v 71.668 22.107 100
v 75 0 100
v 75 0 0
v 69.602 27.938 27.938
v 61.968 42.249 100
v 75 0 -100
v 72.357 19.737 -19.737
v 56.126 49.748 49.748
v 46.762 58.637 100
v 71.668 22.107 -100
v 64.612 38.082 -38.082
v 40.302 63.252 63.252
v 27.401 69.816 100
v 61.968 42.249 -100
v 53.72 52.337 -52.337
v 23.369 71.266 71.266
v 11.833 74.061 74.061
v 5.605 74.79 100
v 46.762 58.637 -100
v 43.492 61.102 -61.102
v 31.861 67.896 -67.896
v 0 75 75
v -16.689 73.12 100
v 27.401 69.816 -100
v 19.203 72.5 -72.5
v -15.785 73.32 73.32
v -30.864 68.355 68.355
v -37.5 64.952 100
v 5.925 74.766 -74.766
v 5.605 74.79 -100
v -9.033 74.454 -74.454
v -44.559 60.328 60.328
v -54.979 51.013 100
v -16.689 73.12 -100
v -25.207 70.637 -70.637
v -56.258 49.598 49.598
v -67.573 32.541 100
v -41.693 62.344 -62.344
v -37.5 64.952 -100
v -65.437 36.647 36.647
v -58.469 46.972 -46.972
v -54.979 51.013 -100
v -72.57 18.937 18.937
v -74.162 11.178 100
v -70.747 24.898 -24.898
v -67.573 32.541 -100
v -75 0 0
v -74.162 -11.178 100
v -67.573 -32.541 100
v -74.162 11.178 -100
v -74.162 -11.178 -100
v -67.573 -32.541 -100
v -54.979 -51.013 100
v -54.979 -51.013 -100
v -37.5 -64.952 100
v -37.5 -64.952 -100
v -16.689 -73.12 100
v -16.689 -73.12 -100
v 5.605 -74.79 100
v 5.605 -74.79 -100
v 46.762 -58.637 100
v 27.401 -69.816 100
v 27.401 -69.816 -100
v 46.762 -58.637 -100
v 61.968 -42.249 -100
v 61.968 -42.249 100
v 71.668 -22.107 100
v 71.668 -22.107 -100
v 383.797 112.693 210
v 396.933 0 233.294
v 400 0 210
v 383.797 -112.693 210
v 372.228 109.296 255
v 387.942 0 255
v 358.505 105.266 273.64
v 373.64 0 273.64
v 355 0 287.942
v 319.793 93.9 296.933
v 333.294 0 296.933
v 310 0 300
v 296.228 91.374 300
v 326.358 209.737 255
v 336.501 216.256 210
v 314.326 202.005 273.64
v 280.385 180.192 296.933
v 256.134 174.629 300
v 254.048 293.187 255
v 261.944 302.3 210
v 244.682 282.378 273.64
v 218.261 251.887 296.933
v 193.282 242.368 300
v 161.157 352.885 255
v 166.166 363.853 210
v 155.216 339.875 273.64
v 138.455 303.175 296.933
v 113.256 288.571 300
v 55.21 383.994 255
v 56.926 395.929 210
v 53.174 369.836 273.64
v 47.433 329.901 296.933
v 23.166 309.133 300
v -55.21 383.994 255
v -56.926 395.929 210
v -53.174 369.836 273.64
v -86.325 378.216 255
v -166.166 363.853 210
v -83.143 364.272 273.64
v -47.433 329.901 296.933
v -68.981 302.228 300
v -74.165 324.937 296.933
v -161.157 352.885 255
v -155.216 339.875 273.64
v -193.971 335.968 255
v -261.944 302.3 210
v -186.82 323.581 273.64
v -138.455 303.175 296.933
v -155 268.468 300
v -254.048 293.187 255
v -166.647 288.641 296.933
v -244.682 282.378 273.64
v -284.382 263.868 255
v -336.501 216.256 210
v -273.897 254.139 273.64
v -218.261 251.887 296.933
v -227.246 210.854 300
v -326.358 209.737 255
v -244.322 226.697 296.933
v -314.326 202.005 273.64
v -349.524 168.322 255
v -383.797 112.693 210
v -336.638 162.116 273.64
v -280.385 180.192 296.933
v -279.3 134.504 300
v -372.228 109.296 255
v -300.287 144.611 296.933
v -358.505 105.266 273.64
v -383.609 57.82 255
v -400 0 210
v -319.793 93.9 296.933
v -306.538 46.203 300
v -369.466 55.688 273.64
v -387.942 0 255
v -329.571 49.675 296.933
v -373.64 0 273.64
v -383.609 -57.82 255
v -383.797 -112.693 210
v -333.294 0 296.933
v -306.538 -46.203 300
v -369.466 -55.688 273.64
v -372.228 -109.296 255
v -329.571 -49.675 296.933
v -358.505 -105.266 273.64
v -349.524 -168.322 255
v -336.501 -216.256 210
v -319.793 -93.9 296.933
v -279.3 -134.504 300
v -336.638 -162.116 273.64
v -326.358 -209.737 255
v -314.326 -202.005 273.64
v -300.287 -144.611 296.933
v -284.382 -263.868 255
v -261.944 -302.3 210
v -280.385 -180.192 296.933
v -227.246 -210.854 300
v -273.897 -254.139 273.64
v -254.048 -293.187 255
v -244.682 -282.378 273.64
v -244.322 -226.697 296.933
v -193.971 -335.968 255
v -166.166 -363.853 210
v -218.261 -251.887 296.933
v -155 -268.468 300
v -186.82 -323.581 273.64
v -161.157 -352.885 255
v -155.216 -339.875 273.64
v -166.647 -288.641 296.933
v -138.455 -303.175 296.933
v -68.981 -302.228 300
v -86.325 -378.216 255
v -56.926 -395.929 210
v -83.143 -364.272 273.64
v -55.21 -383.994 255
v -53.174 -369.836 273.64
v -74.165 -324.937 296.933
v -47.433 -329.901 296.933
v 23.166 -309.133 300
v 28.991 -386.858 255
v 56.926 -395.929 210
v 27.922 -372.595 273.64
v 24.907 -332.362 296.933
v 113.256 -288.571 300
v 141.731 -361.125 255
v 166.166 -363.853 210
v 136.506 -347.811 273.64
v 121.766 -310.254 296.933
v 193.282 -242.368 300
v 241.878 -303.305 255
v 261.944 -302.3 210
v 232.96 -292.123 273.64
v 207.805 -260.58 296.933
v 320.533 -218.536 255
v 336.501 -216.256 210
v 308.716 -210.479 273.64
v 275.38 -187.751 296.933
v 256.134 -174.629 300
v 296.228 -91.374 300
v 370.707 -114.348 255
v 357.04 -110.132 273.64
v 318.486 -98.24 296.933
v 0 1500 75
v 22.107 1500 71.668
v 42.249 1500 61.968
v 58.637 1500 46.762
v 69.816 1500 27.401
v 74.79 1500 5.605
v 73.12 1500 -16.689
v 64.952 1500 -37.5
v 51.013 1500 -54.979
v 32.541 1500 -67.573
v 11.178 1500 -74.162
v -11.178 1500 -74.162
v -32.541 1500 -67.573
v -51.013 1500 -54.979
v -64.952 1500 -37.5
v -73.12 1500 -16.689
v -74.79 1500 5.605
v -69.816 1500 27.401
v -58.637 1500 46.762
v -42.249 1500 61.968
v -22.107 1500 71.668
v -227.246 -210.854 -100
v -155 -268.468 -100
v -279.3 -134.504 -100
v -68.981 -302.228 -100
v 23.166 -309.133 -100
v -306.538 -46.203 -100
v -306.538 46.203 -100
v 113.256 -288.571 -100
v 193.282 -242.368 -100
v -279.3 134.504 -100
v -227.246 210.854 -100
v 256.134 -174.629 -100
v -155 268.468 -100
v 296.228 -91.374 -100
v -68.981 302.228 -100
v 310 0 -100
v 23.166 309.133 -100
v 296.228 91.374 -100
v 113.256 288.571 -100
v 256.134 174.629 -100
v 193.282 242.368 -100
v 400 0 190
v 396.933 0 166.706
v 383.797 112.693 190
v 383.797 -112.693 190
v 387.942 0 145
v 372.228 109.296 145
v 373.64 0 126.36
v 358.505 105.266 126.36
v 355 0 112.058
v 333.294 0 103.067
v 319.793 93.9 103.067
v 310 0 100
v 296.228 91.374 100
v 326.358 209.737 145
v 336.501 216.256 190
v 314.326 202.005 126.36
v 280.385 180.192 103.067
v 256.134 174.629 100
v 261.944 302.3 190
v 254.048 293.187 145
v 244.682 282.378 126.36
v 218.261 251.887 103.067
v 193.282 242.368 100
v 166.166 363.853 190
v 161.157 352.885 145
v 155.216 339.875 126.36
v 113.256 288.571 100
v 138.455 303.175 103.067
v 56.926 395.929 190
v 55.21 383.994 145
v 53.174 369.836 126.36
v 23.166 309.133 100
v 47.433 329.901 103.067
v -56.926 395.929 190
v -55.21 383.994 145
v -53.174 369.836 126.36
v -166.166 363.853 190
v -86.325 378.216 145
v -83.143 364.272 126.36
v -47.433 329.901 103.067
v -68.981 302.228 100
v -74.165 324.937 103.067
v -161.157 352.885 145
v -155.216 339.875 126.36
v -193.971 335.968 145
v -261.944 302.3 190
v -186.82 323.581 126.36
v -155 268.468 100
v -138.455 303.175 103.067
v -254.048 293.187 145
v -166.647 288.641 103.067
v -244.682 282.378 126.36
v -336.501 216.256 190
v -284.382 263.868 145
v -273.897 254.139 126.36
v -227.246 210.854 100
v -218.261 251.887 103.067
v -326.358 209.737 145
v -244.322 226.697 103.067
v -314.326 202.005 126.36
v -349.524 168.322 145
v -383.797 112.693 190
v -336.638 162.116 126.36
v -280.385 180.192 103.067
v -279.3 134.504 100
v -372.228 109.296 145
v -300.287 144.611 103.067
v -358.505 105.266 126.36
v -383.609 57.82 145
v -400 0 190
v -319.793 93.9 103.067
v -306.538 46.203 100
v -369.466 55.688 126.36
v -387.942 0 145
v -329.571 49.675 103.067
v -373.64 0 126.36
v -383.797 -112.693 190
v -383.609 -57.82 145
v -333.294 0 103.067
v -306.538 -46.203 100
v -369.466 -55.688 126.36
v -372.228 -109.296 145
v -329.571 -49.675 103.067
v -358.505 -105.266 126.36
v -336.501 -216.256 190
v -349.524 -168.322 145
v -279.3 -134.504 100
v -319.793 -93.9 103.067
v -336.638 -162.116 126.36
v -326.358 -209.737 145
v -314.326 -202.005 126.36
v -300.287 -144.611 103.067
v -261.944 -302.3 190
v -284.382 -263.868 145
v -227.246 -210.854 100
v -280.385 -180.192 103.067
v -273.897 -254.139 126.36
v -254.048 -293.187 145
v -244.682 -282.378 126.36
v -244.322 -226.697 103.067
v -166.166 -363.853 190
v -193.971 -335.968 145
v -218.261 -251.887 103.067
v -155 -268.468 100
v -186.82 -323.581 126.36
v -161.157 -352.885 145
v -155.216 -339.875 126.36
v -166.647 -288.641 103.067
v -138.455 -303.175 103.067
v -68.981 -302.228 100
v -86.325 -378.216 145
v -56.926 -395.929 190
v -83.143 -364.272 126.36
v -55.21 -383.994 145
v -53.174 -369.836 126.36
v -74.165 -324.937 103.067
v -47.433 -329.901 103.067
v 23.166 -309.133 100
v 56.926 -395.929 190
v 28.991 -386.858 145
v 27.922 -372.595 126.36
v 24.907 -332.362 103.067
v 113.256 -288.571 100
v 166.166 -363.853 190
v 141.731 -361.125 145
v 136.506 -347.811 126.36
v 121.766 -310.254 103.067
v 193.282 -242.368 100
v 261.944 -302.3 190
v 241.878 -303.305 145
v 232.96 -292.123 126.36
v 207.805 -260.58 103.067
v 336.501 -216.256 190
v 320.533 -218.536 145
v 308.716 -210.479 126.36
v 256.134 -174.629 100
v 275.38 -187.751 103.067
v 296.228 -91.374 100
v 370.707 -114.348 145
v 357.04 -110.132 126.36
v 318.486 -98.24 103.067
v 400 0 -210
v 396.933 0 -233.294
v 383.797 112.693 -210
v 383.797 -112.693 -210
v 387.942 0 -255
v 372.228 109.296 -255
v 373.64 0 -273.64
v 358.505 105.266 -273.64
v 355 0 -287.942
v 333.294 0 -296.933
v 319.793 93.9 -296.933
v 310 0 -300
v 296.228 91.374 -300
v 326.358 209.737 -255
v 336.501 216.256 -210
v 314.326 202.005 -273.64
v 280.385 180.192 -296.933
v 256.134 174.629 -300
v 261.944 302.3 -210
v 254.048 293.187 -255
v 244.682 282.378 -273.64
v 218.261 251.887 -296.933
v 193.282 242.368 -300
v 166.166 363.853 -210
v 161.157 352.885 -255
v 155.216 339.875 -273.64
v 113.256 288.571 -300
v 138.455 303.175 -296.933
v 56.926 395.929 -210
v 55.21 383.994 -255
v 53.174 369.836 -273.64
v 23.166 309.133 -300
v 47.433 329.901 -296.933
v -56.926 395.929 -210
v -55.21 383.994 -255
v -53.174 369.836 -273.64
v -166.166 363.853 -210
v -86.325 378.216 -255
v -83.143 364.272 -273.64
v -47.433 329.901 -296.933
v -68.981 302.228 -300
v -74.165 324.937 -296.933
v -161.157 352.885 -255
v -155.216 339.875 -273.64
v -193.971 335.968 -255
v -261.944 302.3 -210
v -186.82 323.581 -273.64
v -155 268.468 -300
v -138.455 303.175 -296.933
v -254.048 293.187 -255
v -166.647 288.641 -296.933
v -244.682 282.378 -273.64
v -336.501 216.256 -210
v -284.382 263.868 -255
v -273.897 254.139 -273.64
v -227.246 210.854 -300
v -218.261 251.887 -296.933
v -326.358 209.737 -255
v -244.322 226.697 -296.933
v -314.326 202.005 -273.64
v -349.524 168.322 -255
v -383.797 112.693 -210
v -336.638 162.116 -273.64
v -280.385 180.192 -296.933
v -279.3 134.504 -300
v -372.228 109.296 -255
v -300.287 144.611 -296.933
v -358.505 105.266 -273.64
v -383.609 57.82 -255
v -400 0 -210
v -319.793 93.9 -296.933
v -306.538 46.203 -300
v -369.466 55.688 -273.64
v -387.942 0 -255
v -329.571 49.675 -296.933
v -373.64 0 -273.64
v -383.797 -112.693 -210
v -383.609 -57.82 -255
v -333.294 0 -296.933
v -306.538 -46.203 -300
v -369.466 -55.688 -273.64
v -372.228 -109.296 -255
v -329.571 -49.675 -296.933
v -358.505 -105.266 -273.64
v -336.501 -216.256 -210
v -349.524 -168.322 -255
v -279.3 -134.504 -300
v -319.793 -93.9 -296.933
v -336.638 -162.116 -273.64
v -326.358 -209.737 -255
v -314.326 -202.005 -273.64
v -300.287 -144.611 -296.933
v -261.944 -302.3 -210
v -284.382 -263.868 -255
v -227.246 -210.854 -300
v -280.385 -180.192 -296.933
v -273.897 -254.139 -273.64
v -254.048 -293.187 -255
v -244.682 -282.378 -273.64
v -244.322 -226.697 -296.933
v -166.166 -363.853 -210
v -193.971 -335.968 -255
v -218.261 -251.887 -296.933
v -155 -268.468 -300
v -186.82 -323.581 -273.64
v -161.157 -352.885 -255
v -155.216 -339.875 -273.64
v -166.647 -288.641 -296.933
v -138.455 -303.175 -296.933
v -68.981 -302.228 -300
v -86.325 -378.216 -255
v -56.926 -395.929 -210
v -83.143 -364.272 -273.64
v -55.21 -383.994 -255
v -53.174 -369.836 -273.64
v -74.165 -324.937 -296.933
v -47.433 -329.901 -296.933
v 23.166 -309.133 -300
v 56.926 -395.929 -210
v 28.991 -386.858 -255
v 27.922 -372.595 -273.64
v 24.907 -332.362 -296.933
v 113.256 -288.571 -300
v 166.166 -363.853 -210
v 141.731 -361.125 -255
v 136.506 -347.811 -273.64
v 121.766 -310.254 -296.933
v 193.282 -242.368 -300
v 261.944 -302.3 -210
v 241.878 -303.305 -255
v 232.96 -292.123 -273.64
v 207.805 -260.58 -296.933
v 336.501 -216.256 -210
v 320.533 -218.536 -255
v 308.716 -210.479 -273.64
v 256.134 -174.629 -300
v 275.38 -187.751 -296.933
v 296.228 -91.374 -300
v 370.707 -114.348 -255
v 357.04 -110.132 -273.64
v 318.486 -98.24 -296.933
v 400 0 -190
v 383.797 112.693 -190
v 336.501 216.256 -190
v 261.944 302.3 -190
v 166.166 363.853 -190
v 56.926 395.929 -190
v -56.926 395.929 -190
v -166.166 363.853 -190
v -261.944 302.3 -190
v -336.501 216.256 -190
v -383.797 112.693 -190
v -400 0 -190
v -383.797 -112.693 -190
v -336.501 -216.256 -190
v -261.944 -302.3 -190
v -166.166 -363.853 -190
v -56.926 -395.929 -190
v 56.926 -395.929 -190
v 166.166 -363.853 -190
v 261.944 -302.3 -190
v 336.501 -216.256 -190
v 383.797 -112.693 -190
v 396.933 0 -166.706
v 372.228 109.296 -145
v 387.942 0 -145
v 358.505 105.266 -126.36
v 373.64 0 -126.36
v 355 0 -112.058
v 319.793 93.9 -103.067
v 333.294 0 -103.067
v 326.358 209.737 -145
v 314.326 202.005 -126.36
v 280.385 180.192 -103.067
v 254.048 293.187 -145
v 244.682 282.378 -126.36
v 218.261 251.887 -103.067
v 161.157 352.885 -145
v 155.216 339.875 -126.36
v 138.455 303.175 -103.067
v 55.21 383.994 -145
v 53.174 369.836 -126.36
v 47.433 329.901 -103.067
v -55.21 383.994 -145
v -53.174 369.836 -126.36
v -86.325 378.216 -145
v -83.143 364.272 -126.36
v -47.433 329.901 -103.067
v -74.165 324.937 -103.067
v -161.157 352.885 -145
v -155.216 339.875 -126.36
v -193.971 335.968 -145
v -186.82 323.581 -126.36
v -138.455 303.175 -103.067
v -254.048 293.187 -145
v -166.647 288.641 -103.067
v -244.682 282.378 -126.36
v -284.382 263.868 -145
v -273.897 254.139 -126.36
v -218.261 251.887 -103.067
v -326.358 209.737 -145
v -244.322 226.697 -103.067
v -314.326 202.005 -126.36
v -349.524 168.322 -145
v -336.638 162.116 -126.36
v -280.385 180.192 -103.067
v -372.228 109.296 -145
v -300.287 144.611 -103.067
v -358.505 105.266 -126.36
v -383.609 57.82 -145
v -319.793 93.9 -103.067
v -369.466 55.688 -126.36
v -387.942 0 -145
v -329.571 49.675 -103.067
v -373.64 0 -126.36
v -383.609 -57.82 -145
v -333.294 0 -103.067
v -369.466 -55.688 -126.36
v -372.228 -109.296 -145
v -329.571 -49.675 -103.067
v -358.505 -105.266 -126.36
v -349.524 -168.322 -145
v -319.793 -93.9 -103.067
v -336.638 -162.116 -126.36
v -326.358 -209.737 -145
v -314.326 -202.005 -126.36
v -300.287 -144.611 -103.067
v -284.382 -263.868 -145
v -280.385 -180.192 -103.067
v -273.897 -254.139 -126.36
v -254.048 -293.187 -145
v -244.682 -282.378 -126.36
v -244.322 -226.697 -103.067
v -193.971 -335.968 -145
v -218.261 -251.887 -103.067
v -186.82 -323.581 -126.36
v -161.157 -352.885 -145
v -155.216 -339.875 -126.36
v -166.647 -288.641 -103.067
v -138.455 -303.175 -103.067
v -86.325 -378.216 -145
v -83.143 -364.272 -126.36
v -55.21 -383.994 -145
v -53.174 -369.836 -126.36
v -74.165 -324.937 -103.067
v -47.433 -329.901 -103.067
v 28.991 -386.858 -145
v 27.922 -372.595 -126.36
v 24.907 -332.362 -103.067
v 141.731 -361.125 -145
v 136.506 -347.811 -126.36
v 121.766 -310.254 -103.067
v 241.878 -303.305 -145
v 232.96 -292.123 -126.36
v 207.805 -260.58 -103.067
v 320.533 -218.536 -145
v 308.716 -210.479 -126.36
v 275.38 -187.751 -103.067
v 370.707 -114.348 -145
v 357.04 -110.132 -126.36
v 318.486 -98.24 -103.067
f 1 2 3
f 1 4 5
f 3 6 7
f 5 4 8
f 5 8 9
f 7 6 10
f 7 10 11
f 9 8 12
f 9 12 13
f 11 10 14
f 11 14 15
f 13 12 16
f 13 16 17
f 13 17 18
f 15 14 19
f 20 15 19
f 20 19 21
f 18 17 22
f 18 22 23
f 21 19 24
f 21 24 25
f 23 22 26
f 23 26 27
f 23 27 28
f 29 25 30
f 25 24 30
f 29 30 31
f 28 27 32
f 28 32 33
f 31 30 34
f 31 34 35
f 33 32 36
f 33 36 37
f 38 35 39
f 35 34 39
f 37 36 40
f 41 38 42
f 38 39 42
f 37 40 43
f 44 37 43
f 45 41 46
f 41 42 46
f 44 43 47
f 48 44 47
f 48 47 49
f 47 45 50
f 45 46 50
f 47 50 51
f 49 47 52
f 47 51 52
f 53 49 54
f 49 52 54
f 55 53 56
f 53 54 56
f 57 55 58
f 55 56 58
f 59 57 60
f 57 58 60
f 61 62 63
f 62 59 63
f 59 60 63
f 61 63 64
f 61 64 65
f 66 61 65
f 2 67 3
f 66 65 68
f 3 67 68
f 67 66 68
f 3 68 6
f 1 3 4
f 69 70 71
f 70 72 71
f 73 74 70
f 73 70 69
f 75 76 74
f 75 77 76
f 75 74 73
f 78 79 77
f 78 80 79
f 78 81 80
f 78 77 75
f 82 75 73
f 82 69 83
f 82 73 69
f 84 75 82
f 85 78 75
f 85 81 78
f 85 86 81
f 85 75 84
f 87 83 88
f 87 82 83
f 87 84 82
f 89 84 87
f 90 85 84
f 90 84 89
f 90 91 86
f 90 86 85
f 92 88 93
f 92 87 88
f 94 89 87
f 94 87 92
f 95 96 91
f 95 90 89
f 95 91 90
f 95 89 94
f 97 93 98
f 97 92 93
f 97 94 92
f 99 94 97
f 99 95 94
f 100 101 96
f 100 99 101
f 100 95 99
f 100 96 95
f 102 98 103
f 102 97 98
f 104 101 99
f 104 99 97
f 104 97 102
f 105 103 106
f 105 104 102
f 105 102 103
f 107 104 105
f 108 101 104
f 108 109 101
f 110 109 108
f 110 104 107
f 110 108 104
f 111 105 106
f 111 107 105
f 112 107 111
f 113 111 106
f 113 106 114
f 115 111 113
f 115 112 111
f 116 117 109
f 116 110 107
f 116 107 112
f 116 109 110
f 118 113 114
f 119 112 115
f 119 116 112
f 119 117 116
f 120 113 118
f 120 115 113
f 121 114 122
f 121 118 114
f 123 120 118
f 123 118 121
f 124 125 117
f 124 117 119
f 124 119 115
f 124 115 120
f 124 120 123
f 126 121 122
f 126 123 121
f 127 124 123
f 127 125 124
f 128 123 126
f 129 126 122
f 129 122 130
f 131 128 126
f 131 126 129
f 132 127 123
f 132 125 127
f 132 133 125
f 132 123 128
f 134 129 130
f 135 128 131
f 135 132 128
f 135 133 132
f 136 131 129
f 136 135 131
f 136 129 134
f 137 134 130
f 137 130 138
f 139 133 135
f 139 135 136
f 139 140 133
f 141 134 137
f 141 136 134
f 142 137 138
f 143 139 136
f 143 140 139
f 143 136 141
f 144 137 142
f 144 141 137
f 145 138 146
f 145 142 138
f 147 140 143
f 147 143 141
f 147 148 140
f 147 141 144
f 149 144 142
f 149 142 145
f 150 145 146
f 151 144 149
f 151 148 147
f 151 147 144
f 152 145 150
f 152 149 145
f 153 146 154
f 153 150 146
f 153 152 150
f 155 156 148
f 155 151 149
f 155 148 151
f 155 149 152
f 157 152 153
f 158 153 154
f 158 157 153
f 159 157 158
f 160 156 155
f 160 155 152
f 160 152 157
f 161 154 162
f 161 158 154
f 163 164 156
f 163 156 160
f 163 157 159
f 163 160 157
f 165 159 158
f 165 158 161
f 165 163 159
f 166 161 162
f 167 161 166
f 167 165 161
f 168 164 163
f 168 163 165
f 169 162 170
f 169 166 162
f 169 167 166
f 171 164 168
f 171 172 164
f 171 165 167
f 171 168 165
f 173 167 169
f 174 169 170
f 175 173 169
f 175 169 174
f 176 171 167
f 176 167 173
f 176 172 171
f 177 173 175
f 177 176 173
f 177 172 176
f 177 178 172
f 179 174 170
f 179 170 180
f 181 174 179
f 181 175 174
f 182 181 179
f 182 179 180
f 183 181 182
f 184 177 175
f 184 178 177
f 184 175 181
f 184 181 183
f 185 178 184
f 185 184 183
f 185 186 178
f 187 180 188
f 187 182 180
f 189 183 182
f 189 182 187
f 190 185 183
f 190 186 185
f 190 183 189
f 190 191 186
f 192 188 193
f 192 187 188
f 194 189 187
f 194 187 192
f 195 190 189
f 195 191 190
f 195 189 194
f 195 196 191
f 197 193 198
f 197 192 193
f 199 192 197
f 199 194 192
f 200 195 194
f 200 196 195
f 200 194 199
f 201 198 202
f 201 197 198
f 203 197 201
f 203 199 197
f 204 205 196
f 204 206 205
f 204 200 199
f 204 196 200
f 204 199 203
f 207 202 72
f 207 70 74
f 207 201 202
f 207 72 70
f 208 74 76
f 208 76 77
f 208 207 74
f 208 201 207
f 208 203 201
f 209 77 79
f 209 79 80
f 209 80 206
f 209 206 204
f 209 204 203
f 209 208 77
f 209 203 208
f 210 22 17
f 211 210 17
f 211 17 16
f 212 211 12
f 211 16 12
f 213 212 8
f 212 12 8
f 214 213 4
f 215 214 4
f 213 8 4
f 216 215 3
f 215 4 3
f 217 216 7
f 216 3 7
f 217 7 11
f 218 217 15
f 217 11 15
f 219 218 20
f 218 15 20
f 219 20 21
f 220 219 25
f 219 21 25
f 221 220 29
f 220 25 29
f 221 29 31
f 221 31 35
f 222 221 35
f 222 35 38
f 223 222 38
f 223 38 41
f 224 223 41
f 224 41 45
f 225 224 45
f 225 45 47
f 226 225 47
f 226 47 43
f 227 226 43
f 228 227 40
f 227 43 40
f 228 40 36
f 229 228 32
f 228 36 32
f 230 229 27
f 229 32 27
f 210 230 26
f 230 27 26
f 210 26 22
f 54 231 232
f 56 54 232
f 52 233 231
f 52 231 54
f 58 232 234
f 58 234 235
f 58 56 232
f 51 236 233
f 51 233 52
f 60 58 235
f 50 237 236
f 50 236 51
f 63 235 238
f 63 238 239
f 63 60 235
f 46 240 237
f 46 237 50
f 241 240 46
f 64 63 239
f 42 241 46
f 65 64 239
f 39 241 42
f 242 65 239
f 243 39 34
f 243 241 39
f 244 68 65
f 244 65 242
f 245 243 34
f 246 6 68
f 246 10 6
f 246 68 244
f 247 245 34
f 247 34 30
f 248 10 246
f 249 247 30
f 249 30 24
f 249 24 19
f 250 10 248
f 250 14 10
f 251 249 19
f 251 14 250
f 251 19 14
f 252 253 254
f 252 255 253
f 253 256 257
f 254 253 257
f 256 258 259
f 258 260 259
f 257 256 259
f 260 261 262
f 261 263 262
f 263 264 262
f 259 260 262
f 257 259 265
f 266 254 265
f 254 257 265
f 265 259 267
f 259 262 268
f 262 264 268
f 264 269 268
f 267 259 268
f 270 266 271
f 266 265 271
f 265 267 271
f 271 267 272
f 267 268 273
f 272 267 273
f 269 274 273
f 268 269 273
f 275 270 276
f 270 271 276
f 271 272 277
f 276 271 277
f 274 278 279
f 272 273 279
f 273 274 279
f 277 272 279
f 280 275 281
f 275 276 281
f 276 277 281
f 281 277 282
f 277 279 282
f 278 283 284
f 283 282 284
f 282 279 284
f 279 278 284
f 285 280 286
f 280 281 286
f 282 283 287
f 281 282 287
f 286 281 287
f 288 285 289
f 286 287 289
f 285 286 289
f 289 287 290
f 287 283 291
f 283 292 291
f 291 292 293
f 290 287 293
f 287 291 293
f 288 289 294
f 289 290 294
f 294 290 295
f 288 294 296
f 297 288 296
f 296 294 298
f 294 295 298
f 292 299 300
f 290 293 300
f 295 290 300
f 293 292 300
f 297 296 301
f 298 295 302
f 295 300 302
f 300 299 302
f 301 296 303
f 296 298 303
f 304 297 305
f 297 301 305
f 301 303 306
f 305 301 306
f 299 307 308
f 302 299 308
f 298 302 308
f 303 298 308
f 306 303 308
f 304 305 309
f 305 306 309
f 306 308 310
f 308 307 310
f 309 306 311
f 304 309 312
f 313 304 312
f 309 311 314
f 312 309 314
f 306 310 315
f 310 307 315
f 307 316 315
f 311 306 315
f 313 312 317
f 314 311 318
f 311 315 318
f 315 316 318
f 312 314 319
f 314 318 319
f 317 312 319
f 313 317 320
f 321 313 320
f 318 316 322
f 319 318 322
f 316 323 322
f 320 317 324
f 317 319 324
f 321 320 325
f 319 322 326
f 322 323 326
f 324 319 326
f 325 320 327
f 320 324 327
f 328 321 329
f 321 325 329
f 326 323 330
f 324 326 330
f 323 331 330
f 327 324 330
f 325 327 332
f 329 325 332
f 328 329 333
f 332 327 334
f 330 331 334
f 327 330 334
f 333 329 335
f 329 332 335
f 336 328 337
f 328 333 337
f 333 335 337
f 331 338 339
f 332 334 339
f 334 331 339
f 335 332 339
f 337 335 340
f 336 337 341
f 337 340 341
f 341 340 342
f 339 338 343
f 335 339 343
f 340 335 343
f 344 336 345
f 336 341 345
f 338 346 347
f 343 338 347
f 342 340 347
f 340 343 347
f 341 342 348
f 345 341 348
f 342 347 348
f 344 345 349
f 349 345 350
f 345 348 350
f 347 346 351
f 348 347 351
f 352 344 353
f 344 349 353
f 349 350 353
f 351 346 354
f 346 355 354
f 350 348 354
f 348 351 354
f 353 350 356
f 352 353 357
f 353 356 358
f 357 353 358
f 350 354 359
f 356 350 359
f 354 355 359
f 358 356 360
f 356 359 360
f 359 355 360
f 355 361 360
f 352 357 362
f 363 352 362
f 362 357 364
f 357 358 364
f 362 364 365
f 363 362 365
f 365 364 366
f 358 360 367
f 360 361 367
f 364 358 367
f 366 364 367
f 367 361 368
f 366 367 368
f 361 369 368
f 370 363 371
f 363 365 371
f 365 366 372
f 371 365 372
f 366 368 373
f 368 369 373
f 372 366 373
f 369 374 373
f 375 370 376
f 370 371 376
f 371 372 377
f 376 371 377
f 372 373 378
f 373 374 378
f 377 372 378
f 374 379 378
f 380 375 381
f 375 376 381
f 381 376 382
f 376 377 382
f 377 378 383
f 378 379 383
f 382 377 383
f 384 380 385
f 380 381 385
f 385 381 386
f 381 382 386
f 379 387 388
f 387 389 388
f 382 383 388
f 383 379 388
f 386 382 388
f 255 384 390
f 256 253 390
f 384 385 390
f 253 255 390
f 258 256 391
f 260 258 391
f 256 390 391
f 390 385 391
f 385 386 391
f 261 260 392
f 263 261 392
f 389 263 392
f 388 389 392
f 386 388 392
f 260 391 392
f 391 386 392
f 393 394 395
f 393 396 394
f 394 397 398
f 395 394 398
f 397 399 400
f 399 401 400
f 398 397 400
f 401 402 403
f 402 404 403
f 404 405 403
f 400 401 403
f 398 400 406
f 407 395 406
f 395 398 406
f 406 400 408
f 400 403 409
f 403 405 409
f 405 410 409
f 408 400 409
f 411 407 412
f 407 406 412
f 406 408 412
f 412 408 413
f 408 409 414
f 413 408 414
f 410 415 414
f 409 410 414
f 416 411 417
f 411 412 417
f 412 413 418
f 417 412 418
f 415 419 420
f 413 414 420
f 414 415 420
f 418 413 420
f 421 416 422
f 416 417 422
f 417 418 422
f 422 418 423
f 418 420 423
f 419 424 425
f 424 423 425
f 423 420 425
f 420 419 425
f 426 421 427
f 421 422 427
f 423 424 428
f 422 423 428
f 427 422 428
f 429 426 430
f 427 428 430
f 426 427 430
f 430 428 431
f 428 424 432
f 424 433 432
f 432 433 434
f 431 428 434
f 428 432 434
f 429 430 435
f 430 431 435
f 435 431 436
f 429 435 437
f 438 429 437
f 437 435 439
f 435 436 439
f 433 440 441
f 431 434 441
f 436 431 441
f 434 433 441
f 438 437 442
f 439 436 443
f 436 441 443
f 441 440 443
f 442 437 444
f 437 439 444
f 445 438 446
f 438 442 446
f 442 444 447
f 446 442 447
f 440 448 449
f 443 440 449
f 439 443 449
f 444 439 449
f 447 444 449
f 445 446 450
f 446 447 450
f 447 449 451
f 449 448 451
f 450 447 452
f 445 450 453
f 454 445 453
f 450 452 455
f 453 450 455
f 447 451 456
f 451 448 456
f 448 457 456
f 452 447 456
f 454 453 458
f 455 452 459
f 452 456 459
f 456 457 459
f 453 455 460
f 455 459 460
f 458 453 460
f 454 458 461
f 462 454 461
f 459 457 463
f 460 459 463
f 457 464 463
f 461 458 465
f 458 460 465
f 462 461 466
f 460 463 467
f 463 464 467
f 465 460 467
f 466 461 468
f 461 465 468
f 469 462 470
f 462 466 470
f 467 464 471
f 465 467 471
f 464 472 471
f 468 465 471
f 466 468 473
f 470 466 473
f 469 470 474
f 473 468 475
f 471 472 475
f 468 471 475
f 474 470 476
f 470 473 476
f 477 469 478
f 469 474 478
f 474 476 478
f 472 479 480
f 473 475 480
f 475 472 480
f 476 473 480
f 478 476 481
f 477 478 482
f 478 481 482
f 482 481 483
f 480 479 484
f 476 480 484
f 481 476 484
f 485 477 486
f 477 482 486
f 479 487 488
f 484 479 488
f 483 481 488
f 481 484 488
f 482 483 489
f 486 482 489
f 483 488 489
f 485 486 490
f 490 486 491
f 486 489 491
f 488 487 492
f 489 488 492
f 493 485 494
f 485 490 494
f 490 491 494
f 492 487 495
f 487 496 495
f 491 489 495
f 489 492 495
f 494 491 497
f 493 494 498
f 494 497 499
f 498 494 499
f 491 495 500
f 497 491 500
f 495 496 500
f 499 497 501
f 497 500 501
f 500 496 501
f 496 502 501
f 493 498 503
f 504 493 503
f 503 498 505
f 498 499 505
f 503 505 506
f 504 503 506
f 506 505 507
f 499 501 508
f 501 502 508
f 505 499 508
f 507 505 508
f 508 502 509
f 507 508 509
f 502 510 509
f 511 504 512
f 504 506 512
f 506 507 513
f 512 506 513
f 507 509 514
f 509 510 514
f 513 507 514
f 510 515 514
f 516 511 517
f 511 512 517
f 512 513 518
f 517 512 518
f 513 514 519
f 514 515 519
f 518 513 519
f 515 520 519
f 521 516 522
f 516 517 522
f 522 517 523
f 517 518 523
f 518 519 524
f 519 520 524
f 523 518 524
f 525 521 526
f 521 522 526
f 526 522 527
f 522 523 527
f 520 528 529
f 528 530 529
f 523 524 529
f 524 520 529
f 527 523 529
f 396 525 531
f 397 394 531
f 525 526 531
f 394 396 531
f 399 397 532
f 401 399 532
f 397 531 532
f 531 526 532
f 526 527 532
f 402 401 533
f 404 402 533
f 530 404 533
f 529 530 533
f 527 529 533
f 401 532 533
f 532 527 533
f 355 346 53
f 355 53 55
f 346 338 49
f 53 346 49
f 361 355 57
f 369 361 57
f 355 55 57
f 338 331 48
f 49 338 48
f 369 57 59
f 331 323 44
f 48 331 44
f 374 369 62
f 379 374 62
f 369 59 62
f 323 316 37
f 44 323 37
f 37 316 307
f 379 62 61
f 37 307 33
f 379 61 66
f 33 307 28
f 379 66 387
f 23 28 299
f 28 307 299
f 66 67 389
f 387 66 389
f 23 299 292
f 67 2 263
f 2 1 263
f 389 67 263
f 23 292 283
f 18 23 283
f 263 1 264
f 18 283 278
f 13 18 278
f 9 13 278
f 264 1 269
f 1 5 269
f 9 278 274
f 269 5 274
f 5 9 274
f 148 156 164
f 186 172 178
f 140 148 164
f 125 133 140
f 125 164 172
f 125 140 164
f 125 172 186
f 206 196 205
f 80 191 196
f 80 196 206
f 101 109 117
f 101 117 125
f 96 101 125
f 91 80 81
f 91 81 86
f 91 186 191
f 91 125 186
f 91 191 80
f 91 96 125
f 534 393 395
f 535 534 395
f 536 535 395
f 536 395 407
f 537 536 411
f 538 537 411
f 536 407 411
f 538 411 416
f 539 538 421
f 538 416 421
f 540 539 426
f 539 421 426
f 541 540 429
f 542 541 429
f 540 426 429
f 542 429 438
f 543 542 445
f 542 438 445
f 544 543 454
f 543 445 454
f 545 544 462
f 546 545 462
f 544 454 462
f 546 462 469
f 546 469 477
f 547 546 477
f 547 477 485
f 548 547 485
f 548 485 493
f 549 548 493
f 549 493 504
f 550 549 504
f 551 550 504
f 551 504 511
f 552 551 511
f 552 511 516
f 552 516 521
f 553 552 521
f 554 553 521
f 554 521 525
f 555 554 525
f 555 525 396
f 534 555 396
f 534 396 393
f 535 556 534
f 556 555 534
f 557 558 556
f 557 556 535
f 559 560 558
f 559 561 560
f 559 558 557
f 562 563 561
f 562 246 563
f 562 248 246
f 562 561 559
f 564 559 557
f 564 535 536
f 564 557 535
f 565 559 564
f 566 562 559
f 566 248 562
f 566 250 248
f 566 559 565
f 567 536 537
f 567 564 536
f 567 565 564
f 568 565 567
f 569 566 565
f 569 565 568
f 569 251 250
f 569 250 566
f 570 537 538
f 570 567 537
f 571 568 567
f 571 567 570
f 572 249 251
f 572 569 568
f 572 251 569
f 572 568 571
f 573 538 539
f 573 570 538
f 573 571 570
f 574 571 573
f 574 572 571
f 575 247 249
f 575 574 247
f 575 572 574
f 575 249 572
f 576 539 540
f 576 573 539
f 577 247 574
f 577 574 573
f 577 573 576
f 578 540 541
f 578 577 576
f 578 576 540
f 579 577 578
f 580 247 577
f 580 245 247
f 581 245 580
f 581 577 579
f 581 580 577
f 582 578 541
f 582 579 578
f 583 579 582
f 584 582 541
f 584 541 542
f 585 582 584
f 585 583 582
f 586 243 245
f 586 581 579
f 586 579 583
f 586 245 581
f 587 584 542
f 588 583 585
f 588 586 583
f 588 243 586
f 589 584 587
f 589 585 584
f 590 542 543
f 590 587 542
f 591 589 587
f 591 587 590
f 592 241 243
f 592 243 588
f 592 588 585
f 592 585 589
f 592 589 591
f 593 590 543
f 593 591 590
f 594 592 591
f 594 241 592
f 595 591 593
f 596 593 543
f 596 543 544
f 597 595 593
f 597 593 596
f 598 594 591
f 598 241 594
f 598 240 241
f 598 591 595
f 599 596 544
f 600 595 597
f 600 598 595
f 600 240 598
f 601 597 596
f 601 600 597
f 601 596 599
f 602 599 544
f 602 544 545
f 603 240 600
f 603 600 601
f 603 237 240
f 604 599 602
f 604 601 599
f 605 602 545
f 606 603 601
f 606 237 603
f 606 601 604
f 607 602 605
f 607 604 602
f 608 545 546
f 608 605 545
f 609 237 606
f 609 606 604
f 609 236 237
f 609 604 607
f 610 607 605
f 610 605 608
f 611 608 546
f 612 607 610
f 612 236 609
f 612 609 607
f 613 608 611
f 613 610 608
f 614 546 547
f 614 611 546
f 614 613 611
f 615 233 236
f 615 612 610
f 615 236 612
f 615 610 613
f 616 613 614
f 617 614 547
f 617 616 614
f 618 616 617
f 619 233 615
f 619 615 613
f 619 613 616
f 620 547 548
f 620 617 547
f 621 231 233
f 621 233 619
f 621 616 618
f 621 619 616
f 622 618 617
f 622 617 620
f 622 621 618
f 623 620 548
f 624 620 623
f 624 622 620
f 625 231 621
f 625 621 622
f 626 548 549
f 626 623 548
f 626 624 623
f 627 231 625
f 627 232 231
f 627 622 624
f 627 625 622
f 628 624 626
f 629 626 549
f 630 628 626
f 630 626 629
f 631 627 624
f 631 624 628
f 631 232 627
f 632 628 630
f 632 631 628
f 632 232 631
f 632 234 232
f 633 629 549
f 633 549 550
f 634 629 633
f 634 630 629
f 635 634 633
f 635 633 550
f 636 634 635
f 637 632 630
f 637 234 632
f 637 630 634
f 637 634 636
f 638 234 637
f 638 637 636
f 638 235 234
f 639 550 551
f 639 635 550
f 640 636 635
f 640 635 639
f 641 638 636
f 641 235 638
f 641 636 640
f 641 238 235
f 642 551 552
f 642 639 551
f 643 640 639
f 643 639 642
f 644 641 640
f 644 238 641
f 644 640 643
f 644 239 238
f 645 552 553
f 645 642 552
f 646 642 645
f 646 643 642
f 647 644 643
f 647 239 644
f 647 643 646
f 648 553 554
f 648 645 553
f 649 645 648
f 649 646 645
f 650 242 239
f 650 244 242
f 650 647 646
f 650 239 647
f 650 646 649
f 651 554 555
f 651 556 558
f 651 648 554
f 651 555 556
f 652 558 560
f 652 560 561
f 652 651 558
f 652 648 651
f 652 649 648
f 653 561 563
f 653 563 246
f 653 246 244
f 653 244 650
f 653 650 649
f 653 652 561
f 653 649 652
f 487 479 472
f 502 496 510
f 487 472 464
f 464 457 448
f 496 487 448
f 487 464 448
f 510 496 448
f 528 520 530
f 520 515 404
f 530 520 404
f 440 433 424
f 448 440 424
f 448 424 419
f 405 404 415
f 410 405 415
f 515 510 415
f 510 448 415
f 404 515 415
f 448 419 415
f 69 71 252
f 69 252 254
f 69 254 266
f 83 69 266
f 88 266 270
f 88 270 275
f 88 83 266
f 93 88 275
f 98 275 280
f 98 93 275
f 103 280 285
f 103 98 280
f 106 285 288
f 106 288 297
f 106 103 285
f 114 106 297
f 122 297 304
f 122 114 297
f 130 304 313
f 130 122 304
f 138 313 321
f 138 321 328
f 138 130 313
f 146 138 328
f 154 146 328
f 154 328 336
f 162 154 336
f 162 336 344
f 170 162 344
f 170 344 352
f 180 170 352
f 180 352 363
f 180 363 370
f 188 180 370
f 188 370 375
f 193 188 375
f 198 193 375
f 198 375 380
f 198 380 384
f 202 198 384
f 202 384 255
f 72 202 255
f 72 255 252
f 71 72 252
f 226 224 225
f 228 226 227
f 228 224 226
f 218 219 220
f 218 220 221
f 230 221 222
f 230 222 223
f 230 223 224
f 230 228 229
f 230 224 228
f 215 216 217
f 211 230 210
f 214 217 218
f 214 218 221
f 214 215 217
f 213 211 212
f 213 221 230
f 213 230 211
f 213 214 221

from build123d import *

# Parameters (mm, degrees)
ESBO_O1_R                     = 75
RESSALTO_EXTRUS_O1_DEPTH      = 1500
RESSALTO_EXTRUS_O2_DEPTH      = 200
RESSALTO_EXTRUS_O2_DEPTH_BACK = 200
ESBO_O2_R                     = 75
ESBO_O3_R                     = 400
RESSALTO_EXTRUS_O3_DEPTH      = 100
FILETE1_R                     = 90
FILETE1_OF_ESPELHAR1_R        = 90


with BuildPart() as part:
    # Esboço1 → Ressalto-extrusão1 (new body)
    with BuildSketch(Plane(origin=(0, 0, 0), x_dir=(1, 0, 0), z_dir=(0, 1, 0))):
        Circle(ESBO_O1_R)
    extrude(amount=RESSALTO_EXTRUS_O1_DEPTH)

    # Esboço2 → Ressalto-extrusão2 (add, two sides: drawn at the far end of the back side and taken through both)
    with BuildSketch(Plane.XY.offset(-RESSALTO_EXTRUS_O2_DEPTH_BACK)):
        Circle(ESBO_O2_R)
    extrude(amount=RESSALTO_EXTRUS_O2_DEPTH + RESSALTO_EXTRUS_O2_DEPTH_BACK)

    # Esboço3 → Ressalto-extrusão3 (add, symmetric)
    with BuildSketch(Plane.XY.offset(200)):
        Circle(ESBO_O3_R)
    ressalto_extrus_o3 = extrude(amount=RESSALTO_EXTRUS_O3_DEPTH, both=True)

    # Filete1
    filete1_edges = [part.edges().sort_by_distance(p)[0] for p in [
        (-400, 0, 300),
        (-400, 0, 100),
    ]]
    fillet(filete1_edges, radius=FILETE1_R)

    # Espelhar1: Ressalto-extrusão3 across plane
    add(ressalto_extrus_o3.mirror(Plane.XY))

    # Filete1 of Espelhar1
    filete1_of_espelhar1_edges = [part.edges().sort_by_distance(p)[0] for p in [
        (-400, 0, -300),
        (-400, 0, -100),
    ]]
    fillet(filete1_of_espelhar1_edges, radius=FILETE1_OF_ESPELHAR1_R)


solid = part.part
